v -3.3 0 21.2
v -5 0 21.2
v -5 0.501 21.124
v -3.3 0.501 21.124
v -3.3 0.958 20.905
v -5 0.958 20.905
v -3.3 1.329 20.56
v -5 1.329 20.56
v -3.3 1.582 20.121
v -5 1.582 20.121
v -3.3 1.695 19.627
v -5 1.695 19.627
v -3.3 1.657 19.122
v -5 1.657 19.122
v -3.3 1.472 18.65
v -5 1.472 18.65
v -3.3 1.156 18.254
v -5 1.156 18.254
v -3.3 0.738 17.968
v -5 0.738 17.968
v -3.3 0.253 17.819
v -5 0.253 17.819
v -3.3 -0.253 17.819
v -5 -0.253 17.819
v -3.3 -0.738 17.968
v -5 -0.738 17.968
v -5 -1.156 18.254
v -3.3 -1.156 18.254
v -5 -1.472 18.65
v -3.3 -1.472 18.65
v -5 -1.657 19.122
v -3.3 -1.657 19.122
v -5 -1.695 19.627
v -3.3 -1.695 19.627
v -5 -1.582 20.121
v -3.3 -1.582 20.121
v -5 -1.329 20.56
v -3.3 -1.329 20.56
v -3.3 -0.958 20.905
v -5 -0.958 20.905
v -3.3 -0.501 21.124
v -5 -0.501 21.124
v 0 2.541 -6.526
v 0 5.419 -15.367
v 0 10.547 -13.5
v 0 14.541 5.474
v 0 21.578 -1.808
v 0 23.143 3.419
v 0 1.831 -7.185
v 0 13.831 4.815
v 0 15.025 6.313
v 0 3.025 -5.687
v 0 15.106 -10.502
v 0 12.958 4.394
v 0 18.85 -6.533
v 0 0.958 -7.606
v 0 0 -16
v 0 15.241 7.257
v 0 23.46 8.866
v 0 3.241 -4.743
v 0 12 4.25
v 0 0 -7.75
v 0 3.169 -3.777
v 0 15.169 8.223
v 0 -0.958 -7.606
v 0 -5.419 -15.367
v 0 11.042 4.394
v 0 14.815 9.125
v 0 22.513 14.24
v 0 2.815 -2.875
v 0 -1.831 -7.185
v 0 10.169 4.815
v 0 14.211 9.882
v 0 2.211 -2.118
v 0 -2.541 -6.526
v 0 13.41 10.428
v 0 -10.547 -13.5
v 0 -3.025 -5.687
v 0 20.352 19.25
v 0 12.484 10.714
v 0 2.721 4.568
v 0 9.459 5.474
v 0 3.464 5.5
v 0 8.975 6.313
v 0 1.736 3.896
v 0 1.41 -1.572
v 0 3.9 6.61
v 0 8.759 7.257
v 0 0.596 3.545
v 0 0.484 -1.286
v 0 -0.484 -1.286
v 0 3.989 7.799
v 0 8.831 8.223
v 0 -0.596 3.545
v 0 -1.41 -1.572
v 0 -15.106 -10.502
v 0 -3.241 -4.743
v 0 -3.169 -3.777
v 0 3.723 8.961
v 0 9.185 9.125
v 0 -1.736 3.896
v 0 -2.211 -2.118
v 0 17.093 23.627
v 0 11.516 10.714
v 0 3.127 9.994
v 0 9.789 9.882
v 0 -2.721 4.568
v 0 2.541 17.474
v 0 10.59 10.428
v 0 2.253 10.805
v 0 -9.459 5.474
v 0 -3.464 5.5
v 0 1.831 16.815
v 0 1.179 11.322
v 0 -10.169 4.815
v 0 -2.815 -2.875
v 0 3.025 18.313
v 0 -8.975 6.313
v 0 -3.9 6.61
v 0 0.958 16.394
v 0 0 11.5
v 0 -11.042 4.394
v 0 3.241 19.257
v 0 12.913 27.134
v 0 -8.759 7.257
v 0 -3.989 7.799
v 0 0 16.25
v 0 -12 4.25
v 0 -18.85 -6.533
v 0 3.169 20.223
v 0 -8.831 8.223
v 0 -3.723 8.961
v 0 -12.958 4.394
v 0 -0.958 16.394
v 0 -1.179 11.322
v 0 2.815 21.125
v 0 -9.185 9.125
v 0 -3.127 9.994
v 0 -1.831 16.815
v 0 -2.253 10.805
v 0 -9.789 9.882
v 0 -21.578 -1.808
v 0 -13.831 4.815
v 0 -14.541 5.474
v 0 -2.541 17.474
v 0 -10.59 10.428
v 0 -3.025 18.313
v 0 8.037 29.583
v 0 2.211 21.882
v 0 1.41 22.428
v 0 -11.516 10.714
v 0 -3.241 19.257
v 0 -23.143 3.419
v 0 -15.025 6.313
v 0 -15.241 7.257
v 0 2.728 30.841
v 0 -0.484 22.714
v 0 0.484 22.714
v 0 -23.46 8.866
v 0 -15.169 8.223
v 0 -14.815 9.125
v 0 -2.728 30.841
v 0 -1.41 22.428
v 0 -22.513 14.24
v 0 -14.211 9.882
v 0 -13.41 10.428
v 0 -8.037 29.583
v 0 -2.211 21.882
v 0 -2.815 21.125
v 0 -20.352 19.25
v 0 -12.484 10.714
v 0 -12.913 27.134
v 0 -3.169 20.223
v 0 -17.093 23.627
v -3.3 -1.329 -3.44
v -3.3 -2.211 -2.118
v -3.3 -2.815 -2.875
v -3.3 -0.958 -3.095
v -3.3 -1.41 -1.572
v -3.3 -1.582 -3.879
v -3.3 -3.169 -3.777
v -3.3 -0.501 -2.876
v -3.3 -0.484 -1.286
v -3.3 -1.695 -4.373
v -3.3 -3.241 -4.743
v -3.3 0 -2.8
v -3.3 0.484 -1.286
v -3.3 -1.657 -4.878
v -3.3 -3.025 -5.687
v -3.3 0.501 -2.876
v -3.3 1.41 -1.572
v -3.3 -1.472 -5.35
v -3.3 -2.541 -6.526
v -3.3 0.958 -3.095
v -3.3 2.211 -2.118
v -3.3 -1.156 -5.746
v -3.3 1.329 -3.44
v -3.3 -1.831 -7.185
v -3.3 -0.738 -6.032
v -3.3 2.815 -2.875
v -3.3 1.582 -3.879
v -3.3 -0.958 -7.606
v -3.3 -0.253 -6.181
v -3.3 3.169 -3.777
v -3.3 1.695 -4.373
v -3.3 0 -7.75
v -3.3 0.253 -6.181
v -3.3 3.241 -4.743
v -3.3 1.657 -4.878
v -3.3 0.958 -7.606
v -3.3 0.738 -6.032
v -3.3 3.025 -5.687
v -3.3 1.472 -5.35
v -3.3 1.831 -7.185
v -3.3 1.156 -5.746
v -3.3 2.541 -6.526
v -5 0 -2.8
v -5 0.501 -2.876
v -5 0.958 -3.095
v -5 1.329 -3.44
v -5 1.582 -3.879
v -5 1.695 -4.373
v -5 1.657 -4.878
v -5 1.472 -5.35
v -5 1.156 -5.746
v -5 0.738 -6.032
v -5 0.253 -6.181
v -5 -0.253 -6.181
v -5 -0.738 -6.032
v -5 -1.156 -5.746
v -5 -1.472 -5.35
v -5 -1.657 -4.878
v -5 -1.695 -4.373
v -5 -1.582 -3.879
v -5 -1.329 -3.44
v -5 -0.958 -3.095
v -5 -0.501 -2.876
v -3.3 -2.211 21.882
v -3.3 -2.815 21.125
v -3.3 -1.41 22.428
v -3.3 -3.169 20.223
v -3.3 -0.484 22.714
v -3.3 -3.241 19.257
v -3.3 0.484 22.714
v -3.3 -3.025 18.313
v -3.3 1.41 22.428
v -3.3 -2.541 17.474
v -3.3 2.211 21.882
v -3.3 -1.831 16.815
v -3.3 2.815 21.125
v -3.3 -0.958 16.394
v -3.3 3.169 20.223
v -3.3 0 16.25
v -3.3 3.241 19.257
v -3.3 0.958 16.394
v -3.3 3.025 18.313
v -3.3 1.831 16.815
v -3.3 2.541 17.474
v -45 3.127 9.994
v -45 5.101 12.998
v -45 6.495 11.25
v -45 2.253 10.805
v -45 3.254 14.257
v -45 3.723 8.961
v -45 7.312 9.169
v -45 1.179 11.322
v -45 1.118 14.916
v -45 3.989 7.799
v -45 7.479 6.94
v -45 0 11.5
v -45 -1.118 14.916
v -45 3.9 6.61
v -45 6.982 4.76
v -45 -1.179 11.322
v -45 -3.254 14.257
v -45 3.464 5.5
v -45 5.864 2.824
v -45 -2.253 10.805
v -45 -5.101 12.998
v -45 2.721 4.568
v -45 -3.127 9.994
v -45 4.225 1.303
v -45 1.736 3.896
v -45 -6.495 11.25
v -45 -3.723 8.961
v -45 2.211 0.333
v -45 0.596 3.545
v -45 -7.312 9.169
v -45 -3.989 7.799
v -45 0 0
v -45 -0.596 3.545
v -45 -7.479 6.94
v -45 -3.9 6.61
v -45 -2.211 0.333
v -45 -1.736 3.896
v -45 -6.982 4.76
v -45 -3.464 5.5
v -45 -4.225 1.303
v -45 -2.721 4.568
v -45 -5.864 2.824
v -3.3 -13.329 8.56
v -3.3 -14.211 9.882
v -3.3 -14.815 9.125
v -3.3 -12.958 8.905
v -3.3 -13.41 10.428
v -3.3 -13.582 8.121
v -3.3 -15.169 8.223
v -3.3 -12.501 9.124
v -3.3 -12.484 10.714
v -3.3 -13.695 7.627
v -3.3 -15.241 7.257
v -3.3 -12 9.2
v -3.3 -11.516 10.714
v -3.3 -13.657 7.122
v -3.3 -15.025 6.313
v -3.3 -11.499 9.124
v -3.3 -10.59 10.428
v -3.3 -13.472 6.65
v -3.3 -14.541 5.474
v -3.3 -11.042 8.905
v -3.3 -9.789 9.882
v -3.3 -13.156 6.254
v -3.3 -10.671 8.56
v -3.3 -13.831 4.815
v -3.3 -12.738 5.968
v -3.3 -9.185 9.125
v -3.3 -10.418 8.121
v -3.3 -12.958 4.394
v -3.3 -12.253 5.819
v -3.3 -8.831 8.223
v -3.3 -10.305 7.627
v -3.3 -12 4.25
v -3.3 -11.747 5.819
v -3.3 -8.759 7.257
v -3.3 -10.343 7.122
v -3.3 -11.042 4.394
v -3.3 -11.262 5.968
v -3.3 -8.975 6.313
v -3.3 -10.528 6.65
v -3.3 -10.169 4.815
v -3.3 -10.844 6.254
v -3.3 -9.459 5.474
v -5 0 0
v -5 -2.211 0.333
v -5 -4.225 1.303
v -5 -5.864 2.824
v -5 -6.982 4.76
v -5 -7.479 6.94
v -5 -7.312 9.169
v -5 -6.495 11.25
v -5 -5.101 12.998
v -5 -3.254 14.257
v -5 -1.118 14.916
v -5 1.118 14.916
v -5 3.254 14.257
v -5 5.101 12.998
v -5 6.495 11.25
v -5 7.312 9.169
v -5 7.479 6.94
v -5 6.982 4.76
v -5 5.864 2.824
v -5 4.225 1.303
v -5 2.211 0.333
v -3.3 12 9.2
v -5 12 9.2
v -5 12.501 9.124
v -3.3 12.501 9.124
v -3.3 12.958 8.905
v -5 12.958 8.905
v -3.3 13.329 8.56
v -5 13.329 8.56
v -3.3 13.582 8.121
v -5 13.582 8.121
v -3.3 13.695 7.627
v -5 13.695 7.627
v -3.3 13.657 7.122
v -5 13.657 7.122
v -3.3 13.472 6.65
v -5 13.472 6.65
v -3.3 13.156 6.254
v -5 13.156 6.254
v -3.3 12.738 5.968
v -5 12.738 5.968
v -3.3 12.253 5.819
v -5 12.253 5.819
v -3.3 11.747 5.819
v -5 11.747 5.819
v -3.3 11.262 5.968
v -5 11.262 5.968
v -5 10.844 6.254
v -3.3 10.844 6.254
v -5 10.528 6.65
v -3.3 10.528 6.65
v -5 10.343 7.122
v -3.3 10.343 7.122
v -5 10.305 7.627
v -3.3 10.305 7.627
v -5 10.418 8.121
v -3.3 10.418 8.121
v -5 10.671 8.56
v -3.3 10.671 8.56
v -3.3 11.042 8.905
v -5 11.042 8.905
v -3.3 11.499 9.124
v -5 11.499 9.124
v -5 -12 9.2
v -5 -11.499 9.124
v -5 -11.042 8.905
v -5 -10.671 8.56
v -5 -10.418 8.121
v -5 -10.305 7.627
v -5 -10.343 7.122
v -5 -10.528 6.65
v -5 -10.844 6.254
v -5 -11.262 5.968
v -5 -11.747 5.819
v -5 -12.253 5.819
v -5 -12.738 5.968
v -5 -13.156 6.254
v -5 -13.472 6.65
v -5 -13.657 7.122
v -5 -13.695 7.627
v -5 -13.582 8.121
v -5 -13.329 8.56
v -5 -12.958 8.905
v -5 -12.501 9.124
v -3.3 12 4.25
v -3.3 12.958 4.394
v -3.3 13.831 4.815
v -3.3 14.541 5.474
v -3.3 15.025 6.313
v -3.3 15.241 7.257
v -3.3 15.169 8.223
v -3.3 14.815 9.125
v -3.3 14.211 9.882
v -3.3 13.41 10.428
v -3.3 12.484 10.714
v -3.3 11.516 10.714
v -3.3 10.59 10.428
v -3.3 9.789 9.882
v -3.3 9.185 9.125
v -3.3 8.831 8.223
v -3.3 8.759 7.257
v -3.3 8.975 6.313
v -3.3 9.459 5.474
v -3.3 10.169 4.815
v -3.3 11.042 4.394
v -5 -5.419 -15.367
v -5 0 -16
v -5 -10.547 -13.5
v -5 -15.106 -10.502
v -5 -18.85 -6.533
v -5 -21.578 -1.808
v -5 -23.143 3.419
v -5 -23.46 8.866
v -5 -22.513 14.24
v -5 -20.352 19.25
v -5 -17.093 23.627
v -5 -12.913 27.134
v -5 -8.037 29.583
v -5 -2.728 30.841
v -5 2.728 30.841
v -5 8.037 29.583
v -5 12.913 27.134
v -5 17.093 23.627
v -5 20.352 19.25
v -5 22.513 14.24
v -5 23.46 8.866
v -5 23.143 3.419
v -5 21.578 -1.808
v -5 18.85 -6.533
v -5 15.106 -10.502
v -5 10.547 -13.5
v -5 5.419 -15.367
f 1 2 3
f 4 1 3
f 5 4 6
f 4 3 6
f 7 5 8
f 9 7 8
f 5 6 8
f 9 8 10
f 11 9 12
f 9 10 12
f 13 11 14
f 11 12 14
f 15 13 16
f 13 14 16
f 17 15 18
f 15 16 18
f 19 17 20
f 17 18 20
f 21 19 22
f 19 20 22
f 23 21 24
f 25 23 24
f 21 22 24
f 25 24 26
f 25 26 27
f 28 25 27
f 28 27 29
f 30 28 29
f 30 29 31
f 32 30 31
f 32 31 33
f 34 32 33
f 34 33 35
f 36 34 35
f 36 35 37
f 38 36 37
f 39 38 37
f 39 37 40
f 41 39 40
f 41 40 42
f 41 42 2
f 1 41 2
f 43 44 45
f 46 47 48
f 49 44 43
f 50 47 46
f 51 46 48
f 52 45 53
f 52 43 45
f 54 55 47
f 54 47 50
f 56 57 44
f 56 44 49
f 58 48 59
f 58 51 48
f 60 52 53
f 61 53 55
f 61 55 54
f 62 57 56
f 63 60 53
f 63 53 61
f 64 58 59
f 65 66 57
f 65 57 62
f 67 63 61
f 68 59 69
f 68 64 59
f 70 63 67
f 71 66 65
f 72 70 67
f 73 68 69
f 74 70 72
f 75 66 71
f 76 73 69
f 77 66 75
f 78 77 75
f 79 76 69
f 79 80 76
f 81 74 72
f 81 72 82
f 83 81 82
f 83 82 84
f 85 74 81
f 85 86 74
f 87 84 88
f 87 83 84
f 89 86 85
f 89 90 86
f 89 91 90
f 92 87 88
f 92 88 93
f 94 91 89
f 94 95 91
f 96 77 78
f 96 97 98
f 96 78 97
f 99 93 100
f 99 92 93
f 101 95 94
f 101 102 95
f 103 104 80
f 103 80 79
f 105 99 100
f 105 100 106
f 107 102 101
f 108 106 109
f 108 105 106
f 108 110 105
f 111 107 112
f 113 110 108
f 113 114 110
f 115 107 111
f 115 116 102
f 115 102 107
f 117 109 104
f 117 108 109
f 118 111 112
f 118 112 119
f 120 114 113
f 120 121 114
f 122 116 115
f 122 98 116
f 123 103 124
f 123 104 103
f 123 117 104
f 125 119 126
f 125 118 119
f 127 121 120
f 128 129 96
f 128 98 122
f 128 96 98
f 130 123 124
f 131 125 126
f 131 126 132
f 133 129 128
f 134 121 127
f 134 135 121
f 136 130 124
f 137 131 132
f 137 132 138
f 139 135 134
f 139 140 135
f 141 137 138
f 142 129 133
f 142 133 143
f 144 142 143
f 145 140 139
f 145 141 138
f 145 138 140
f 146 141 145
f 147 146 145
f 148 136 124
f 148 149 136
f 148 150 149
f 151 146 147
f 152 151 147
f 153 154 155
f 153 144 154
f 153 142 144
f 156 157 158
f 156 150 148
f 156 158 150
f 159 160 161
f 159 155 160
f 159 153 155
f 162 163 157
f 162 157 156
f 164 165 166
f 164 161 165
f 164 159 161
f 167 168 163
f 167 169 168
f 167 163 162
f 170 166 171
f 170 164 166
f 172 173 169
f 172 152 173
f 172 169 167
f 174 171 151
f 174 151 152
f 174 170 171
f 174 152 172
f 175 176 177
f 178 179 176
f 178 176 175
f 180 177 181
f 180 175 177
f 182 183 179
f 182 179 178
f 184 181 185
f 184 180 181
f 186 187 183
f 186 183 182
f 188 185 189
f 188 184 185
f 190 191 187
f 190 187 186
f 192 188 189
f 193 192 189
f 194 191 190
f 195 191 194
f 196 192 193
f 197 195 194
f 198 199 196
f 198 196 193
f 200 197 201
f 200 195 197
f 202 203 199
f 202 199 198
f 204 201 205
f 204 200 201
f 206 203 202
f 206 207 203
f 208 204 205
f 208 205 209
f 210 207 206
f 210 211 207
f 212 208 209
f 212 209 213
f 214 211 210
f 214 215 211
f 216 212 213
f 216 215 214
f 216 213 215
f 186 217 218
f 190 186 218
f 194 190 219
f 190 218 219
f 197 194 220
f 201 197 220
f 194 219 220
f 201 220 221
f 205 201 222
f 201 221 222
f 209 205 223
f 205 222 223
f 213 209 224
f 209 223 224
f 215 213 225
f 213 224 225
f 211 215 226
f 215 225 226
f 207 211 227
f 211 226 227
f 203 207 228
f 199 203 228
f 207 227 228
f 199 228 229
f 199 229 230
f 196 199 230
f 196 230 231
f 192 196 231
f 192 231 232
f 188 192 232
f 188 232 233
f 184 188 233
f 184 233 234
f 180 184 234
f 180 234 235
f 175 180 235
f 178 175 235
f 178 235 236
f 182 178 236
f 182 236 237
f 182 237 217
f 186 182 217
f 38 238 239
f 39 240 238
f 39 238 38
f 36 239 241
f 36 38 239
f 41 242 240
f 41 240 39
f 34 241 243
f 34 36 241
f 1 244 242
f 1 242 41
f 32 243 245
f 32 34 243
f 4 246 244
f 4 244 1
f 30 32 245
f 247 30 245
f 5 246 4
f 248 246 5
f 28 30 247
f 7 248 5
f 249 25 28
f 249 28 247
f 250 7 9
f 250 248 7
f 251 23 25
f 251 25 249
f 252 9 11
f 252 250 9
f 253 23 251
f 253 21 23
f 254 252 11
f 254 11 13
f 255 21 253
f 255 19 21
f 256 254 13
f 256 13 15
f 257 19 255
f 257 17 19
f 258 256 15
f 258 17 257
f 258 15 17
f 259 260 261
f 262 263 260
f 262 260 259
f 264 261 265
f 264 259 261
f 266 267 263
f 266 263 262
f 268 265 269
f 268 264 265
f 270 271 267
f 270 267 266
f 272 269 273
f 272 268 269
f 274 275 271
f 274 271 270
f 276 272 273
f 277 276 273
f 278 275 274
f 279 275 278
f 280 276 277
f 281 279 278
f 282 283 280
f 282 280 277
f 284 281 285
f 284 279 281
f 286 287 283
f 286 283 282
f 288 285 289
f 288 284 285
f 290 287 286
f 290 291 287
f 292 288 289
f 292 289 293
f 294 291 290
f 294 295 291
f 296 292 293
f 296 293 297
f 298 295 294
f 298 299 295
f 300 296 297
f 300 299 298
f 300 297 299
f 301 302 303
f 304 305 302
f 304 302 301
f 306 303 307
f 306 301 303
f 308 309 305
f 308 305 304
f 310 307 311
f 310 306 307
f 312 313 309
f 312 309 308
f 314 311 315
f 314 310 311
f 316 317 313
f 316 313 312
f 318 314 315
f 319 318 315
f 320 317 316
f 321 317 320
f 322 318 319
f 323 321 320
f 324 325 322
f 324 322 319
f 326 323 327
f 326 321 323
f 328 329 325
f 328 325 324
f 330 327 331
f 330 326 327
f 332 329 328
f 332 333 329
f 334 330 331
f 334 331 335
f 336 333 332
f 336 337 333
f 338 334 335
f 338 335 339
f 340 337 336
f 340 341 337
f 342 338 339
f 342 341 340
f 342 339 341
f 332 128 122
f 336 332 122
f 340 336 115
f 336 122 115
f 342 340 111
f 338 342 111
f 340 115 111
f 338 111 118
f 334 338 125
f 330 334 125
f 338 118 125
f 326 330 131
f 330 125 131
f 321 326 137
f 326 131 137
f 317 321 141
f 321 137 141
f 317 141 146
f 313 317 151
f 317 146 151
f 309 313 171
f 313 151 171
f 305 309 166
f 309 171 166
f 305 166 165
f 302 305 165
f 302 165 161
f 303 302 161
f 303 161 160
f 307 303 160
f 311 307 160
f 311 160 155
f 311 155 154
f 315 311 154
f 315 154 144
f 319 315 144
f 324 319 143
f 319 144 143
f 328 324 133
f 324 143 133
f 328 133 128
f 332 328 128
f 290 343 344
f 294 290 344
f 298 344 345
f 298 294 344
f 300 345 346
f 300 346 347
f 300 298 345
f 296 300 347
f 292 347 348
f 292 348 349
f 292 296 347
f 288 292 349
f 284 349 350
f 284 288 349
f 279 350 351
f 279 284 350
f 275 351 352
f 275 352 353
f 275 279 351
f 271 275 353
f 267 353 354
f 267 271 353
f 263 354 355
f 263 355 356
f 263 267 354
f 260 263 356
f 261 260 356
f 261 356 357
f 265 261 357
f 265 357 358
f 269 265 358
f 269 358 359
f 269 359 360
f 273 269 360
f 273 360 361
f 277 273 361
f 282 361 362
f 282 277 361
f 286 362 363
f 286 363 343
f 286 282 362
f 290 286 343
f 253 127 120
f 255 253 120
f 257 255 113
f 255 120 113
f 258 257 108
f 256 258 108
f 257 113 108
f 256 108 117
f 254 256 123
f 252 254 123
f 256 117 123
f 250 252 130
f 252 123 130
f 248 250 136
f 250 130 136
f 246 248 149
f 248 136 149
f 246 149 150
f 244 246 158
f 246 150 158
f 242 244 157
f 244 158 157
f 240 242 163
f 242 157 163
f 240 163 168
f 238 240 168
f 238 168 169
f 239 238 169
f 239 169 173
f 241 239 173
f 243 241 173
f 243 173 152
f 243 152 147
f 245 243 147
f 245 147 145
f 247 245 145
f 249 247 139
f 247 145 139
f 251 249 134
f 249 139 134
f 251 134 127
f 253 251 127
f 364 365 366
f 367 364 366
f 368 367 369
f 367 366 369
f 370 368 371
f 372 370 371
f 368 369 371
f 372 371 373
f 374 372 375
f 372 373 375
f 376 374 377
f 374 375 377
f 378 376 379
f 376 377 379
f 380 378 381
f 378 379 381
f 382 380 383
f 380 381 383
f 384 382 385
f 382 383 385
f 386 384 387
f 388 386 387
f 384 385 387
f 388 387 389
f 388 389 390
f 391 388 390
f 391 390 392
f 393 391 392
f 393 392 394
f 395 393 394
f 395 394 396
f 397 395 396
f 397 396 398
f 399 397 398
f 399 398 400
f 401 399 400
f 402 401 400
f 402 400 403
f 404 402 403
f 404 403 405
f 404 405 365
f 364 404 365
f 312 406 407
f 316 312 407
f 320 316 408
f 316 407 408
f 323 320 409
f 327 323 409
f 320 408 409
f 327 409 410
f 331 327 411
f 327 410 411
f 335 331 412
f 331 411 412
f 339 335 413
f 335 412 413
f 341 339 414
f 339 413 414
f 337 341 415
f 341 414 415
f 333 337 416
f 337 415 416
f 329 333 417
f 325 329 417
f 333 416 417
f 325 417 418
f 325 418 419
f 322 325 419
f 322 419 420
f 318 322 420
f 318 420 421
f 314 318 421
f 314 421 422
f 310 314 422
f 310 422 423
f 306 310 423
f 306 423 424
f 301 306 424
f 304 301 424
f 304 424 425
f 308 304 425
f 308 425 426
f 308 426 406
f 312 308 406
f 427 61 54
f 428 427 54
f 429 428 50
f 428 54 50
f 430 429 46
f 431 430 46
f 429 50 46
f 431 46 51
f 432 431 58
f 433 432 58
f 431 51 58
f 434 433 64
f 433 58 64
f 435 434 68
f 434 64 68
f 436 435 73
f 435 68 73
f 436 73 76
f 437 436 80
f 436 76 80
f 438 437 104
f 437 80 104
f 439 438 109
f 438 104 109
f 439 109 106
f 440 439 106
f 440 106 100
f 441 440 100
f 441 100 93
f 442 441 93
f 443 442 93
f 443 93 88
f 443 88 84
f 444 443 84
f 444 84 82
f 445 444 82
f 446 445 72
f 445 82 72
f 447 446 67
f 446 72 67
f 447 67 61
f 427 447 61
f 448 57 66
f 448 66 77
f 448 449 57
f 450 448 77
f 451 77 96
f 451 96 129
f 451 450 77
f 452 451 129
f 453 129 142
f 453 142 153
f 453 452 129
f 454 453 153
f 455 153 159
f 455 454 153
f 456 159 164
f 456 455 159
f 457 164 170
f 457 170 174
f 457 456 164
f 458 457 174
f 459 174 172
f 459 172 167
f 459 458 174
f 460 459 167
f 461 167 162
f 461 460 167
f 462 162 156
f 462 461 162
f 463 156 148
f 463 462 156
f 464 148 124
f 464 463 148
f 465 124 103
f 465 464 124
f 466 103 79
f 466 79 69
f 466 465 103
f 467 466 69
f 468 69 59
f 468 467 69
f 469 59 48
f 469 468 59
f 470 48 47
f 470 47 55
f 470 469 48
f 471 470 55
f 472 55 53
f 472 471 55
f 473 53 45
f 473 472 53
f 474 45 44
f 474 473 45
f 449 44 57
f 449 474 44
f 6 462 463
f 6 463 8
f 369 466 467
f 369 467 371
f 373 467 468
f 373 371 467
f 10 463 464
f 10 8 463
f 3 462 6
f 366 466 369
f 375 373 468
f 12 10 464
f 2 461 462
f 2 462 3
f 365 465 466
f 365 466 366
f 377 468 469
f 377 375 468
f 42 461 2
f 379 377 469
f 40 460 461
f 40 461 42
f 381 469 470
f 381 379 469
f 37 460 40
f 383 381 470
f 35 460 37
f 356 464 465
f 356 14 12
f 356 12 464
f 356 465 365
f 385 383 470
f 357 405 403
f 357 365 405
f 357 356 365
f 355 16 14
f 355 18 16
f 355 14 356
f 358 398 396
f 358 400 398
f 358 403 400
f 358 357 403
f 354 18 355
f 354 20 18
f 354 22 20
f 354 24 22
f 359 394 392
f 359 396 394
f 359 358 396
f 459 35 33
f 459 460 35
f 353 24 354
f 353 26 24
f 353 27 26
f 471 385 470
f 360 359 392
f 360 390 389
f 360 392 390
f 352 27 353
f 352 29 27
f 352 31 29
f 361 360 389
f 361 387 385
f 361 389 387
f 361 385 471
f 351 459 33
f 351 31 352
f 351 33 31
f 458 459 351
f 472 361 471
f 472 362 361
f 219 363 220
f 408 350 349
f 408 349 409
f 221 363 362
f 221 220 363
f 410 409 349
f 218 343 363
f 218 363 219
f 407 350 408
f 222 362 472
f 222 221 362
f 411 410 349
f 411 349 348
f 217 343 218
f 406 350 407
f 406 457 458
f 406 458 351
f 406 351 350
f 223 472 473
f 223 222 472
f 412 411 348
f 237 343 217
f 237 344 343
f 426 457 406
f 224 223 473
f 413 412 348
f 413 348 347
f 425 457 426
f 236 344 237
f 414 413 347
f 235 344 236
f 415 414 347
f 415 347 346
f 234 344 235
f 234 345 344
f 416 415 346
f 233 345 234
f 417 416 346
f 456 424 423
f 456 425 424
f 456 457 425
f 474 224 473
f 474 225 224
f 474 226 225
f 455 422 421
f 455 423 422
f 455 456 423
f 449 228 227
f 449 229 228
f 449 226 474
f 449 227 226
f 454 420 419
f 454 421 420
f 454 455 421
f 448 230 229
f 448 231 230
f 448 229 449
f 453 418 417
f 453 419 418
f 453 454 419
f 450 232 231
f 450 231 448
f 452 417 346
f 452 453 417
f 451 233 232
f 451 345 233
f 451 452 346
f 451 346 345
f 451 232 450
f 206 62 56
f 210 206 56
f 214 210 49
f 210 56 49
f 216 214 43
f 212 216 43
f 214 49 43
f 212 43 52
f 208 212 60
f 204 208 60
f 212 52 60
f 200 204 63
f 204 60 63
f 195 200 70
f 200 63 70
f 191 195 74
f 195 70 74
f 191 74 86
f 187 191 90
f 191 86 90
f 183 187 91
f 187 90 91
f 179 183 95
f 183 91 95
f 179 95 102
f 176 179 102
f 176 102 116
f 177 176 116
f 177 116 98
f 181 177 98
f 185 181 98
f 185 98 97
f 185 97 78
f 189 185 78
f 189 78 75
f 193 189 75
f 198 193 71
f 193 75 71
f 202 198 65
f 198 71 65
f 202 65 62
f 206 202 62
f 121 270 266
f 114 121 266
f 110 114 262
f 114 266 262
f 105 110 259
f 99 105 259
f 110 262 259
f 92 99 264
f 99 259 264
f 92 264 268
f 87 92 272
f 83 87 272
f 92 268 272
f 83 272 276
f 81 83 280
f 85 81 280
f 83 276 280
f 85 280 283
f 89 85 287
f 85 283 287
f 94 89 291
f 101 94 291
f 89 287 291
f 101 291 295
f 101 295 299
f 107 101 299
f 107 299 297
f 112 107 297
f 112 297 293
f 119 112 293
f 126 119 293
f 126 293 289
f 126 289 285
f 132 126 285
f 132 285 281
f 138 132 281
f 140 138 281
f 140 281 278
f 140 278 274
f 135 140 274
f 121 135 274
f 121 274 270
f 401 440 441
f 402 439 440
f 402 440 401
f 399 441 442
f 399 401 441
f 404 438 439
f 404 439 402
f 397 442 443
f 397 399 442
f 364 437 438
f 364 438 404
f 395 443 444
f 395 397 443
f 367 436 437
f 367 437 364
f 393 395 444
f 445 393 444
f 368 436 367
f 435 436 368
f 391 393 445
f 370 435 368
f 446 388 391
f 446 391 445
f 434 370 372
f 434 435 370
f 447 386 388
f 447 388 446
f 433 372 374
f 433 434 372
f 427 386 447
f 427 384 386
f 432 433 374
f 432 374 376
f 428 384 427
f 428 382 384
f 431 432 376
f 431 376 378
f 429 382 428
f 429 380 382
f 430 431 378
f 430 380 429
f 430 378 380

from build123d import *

# Parameters (mm, degrees)
SKETCH_2_R          = 1.7
CUT_EXTRUDE_1_DEPTH = 6
SKETCH_3_R          = 3.25
CUT_EXTRUDE_2_DEPTH = 3.3
SKETCH_4_R          = 4
CUT_EXTRUDE_3_DEPTH = 46


with BuildPart() as part:
    # 草图1 → 旋转1 (revolve)
    with BuildSketch(Plane(origin=(0, 0, 0), x_dir=(1, 0, 0), z_dir=(0, 1, 0))):
        Polygon((0, 0), (0, 16), (-5, 16), (-5, 0), (-45, 0), (-45, -7.5), (0, -7.5), align=None)
    revolve(axis=Axis((0, 0, 7.5), (-1, 0, 0)))

    # 草图2 → 切除-拉伸1 (cut, through all)
    with BuildSketch(Plane.ZY.offset(5)):
        with Locations((7.5, 12)):
            Circle(SKETCH_2_R)
        with Locations((19.5, 0)):
            Circle(SKETCH_2_R)
        with Locations((7.5, -12)):
            Circle(SKETCH_2_R)
        with Locations((-4.5, 0)):
            Circle(SKETCH_2_R)
    extrude(amount=-CUT_EXTRUDE_1_DEPTH, mode=Mode.SUBTRACT)

    # 草图3 → 切除-拉伸2 (cut)
    with BuildSketch(Plane(origin=(0, 0, 0), x_dir=(0, 0, -1), z_dir=(1, 0, 0))):
        with Locations((-7.5, 12)):
            Circle(SKETCH_3_R)
        with Locations((-19.5, 0)):
            Circle(SKETCH_3_R)
        with Locations((4.5, 0)):
            Circle(SKETCH_3_R)
        with Locations((-7.5, -12)):
            Circle(SKETCH_3_R)
    extrude(amount=-CUT_EXTRUDE_2_DEPTH, mode=Mode.SUBTRACT)

    # 草图4 → 切除-拉伸3 (cut, through all)
    with BuildSketch(Plane.ZY.offset(45)):
        with Locations((7.5, 0)):
            Circle(SKETCH_4_R)
    extrude(amount=-CUT_EXTRUDE_3_DEPTH, mode=Mode.SUBTRACT)


solid = part.part
